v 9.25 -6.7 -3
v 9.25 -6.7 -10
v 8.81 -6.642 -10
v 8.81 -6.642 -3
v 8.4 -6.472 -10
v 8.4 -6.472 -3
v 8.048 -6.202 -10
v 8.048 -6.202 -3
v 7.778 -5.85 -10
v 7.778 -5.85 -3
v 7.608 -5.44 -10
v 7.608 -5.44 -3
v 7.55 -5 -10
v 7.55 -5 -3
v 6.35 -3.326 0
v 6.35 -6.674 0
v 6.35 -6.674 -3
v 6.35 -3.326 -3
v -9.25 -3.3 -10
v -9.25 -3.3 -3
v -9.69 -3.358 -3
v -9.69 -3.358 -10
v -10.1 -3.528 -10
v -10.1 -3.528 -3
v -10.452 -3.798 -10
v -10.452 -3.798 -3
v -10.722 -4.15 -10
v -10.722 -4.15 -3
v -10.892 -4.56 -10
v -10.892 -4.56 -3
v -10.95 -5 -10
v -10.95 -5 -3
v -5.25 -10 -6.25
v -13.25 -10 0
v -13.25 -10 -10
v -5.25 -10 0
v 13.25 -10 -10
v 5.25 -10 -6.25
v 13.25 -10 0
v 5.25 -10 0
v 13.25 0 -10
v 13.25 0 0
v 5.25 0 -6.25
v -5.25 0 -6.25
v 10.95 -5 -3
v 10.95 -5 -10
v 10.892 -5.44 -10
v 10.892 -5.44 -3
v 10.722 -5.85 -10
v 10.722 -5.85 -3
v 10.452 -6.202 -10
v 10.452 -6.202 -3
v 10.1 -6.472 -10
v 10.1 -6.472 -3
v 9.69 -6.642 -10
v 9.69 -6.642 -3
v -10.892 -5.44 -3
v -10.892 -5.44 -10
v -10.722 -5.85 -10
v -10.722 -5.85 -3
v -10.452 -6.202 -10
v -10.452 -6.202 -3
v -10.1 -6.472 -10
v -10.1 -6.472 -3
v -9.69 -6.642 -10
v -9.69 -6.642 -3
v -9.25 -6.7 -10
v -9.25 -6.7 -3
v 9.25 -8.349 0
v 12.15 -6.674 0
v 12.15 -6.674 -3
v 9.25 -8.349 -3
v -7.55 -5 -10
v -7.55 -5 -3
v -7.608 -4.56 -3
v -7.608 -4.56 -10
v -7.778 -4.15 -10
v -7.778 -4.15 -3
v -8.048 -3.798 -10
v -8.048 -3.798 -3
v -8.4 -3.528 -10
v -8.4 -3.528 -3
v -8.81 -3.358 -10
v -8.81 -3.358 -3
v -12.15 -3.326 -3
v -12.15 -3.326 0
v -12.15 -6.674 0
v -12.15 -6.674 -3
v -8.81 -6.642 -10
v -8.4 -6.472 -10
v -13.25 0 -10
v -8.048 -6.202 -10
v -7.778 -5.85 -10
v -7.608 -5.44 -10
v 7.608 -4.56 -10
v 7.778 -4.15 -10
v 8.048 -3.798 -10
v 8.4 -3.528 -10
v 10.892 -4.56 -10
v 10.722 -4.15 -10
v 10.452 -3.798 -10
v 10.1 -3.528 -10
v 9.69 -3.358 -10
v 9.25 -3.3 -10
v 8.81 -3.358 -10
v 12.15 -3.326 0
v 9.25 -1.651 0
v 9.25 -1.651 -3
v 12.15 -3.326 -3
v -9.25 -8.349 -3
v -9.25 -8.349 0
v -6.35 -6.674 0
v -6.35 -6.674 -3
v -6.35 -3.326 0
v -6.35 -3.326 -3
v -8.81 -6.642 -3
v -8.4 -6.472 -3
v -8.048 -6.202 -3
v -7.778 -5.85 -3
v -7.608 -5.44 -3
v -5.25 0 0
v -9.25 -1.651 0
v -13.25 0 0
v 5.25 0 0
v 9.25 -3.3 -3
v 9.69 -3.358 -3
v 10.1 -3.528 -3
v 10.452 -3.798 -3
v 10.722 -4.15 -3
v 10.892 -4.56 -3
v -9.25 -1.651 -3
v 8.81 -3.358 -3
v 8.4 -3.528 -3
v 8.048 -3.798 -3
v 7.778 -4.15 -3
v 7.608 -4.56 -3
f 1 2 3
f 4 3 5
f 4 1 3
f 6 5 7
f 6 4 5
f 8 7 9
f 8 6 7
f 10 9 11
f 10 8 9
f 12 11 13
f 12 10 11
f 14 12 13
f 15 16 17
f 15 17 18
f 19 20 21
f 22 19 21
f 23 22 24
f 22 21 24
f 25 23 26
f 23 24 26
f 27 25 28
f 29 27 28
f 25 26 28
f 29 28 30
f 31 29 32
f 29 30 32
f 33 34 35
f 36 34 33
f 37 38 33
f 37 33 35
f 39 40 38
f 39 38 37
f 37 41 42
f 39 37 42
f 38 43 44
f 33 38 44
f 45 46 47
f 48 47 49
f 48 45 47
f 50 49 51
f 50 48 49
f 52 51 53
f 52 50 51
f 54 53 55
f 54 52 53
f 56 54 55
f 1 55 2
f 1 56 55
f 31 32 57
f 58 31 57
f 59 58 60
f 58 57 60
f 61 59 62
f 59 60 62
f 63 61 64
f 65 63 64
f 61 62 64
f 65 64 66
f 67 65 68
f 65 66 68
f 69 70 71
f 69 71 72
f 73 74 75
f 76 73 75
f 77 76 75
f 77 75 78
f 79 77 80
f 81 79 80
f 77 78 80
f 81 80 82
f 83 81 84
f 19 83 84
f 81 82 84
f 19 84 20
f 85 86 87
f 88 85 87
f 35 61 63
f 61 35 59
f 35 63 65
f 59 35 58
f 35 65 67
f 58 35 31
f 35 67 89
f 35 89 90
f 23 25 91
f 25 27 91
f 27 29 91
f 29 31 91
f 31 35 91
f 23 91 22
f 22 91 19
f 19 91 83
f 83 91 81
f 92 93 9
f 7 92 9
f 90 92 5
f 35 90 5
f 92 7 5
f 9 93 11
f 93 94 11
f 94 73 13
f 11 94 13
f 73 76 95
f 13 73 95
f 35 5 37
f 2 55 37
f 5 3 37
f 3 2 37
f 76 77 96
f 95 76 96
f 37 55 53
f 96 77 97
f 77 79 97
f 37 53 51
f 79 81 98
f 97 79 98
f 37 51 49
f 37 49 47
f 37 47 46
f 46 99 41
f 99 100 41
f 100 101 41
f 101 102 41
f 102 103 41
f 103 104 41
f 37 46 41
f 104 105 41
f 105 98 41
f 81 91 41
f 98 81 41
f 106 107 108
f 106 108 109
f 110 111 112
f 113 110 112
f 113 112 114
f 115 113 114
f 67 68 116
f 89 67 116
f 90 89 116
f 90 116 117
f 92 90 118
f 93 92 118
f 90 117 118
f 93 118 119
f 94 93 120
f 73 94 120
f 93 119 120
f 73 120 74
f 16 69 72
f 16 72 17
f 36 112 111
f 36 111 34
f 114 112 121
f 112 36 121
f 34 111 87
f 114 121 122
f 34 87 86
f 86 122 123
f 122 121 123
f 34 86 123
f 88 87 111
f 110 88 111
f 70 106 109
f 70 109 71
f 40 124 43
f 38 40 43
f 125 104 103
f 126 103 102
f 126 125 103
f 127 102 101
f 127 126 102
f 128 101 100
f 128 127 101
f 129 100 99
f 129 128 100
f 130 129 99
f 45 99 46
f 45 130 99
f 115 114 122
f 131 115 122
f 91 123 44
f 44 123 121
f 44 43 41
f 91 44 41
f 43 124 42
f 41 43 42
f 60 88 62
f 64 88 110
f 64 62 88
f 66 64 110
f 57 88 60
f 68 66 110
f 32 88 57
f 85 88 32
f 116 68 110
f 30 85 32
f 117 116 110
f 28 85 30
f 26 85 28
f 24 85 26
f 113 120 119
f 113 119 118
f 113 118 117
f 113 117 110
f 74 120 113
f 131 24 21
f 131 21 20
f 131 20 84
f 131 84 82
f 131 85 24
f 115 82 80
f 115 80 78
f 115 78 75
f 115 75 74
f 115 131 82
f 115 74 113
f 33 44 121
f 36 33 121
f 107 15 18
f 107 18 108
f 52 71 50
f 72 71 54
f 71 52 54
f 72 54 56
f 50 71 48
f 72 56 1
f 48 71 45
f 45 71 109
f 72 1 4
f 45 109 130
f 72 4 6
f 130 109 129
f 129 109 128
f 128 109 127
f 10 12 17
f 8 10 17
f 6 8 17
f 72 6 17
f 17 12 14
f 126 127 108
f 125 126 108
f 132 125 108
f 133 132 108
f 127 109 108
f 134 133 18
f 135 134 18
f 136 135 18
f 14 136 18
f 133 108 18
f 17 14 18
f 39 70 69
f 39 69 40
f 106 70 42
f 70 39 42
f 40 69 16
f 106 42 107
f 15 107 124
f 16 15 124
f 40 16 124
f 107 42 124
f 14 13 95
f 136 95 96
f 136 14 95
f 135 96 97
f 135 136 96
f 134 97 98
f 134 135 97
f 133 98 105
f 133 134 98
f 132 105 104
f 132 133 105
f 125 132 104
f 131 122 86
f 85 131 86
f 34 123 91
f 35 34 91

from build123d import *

# Parameters (mm, degrees)
F1_DEPTH = 10
F3_DEPTH = 10.001
F4_DEPTH = 3


# Not quite as in the source:
# - a pattern or mirror of a feature is missing from the dataset's text; its kind, count and spacing are read off the source's solid


with BuildPart() as f1:
    # F0 (on Front) → F1 (new body)
    with BuildSketch(Plane.XZ):
        Polygon((0, -10), (0, -6.25), (-5.25, -6.25), (-5.25, 0), (-13.25, 0), (-13.25, -10), align=None)
        Polygon((5.25, -6.25), (0, -6.25), (0, -10), (13.25, -10), (13.25, 0), (5.25, 0), align=None)
    extrude(amount=F1_DEPTH)

    # F2 (on face) → F3 (cut, through all)
    with BuildSketch(Plane.XY):
        with BuildLine():
            ThreePointArc((-9.25, -3.3), (-10.452081528, -3.797918472), (-10.95, -5))
            Line((-10.95, -5), (-9.25, -5))
            Line((-9.25, -5), (-9.25, -3.3))
        make_face()
        with BuildLine():
            Line((-9.25, -3.3), (-9.25, -5))
            Line((-9.25, -5), (-7.55, -5))
            ThreePointArc((-7.55, -5), (-8.047918472, -3.797918472), (-9.25, -3.3))
        make_face()
        with BuildLine():
            Line((-7.55, -5), (-9.25, -5))
            Line((-9.25, -5), (-9.25, -6.7))
            ThreePointArc((-9.25, -6.7), (-8.047918472, -6.202081528), (-7.55, -5))
        make_face()
        with BuildLine():
            Line((-9.25, -5), (-10.95, -5))
            ThreePointArc((-10.95, -5), (-10.452081528, -6.202081528), (-9.25, -6.7))
            Line((-9.25, -6.7), (-9.25, -5))
        make_face()
    f3 = extrude(amount=-F3_DEPTH, mode=Mode.SUBTRACT)

    # F3_copies: F3 across plane
    add(f3.mirror(Plane(origin=(0, 0, 0), x_dir=(0, 0, 1), z_dir=(1, 0, 0))), mode=Mode.SUBTRACT)

    # F2 (on face) → F4 (cut)
    with BuildSketch(Plane.XY):
        with BuildLine():
            Line((-12.15, -3.3256842194), (-12.15, -5))
            Line((-12.15, -5), (-10.95, -5))
            ThreePointArc((-10.95, -5), (-10.452081528, -3.797918472), (-9.25, -3.3))
            Line((-9.25, -3.3), (-9.25, -1.6513684387))
            Line((-9.25, -1.6513684387), (-12.15, -3.3256842194))
        make_face()
        with BuildLine():
            Line((-10.95, -5), (-12.15, -5))
            Line((-12.15, -5), (-12.15, -6.6743157806))
            Line((-12.15, -6.6743157806), (-9.25, -8.3486315613))
            Line((-9.25, -8.3486315613), (-9.25, -6.7))
            ThreePointArc((-9.25, -6.7), (-10.452081528, -6.202081528), (-10.95, -5))
        make_face()
        with BuildLine():
            Line((-9.25, -1.6513684387), (-9.25, -3.3))
            ThreePointArc((-9.25, -3.3), (-8.047918472, -3.797918472), (-7.55, -5))
            Line((-7.55, -5), (-6.35, -5))
            Line((-6.35, -5), (-6.35, -3.3256842194))
            Line((-6.35, -3.3256842194), (-9.25, -1.6513684387))
        make_face()
        with BuildLine():
            ThreePointArc((-7.55, -5), (-8.047918472, -6.202081528), (-9.25, -6.7))
            Line((-9.25, -6.7), (-9.25, -8.3486315613))
            Line((-9.25, -8.3486315613), (-6.35, -6.6743157806))
            Line((-6.35, -6.6743157806), (-6.35, -5))
            Line((-6.35, -5), (-7.55, -5))
        make_face()
    f4 = extrude(amount=-F4_DEPTH, mode=Mode.SUBTRACT)

    # F4_copies: F4 across plane
    add(f4.mirror(Plane(origin=(0, 0, 0), x_dir=(0, 0, 1), z_dir=(1, 0, 0))), mode=Mode.SUBTRACT)


solid = f1.part
